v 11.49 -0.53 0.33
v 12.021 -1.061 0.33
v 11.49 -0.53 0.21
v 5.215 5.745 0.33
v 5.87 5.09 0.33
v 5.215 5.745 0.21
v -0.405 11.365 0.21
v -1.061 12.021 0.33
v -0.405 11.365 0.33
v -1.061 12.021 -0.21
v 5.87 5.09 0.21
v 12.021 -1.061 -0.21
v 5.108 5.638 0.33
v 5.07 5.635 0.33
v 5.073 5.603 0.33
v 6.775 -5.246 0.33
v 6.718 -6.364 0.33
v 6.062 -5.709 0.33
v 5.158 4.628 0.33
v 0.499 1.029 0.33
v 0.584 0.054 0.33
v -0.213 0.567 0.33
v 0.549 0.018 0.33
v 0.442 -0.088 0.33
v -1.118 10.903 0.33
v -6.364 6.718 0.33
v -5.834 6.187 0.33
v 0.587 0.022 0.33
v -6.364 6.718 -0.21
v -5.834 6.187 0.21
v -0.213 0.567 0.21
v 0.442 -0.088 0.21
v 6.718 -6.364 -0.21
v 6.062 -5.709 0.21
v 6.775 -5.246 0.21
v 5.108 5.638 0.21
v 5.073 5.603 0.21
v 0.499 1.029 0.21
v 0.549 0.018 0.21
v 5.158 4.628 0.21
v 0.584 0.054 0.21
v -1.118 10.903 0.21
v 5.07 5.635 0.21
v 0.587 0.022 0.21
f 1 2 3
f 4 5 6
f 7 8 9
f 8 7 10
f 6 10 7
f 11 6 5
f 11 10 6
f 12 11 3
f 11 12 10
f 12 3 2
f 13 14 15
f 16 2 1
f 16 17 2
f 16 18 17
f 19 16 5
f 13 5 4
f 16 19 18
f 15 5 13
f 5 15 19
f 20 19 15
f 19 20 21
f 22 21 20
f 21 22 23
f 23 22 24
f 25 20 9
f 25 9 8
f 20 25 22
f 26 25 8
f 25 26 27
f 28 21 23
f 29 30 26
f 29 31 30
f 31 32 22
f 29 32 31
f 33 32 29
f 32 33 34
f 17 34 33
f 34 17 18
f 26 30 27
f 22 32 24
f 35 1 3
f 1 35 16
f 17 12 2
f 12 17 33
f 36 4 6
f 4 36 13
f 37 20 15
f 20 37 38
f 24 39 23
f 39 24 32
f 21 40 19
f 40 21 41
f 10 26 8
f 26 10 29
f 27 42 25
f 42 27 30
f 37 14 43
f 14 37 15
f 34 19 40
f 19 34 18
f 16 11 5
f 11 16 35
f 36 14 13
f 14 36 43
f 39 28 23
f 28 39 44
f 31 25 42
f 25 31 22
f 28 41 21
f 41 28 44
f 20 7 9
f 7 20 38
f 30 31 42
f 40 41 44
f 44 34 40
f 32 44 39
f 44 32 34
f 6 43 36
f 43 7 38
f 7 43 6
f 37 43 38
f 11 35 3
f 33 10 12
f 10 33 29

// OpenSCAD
part( "door" );

preview = true;

shack_width = 15;
shack_depth = 14;
shack_height = 25;

shack_raise = 11;

roof_overhang = 1.5;
roof_radius = 15;
roof_thickness = 0.5;

bottom_thickness = .8;

door_width = 8;
door_height = 20;
doorstep = 1;

bridge_length = 7;

window_width = 6;
window_height = 6;
window_ver_pos = 16;

wall_thickness = 1;
floor_thickness = 1;

frame_width = 0.75;
frame_thickness = 0.06 * 4;

plank_width = 0.75;
plank_thickness = 0.24;

socket_diameter = 24.8;
socket_height = 9.5;

pole_width = 0.5 * 2 + 1.3;

base_thickness = 3;
tolerance = 0.1;

BIAS = 0.02;
INV = 100;

X_AXIS = [1, 0, 0];
Y_AXIS = [0, 1, 0];
Z_AXIS = [0, 0, 1];

ALIGN_CENTER_BOTTOM = [0, 0, -1];

roof_width = shack_width + 2 * roof_overhang;
roof_depth = shack_depth + 2 * roof_overhang;

hinge_x = door_width / 2 - 1.5;
hinge_y = (frame_thickness + plank_thickness - wall_thickness) / 2;


wire_pos = [[shack_width / 2 - wall_thickness - 1.3 / 2,
             shack_depth / 2 - wall_thickness - 1.3 / 2],
            [-shack_width / 2 + wall_thickness + 1.3 / 2,
             shack_depth / 2 - wall_thickness - 1.3 / 2]];
bridge_width = 2 * wire_pos[0][0] - pole_width + 1;

posses = concat([
        [-hinge_x, -hinge_y-shack_depth / 2],
        [wire_pos[0][0], -wire_pos[0][1]]
    ], wire_pos);

beam_thickness = wire_pos[0][0] + posses[0][0] - pole_width;

roof_too_big  = (sqrt(pow(roof_width, 2) + pow(roof_depth, 2)) > socket_diameter);
if (roof_too_big) {
   echo("WARNING: The roof is bigger than the hole for the socket!!!");
}

shack_too_big = (sqrt(pow(shack_width + 2 * (plank_thickness + frame_thickness), 2) + pow(shack_depth + 2 * (plank_thickness + frame_thickness), 2)) > socket_diameter);
if (roof_too_big) {
   echo("WARNING: The shack is bigger than the hole for the socket!!!");
}   

doorstep_too_big = (shack_raise - bottom_thickness > socket_height)
    ? (sqrt(pow(shack_depth + doorstep, 2) + pow((shack_width + door_width)/2, 2)) > socket_diameter)
    : (sqrt(pow(shack_depth / 2 + doorstep, 2) + pow(door_width/2, 2)) > socket_diameter/2);
if(doorstep_too_big) {
    echo("WARNING: The doorstep is bigger than the hole for the socket!!!");
}

bridge_length_too_big = (shack_raise - bottom_thickness > socket_height)
    ? (sqrt(pow(shack_depth + bridge_length, 2) + pow((shack_width + bridge_width)/2, 2)) > socket_diameter)
    : (sqrt(pow(shack_depth / 2 + bridge_length, 2) + pow(bridge_width/2, 2)) > socket_diameter/2);
if(bridge_length_too_big) {
    echo("WARNING: The bridge length is bigger than the hole for the socket!!!");
}

module part(part = "all") {
    $fn= preview ? 16 : 64;
    if (part == "roof") {
        $fn= 128;
        rotate(90, X_AXIS) roof();
        echo("Print layer-height = 0.06");
    } else if (part == "wall_back") {
        $fn= 64;
        rotate(-135, Z_AXIS) rotate(90, X_AXIS) wall_back();
        echo("Print layer-height = 0.06");
    } else if (part == "wall_left") {
        $fn= 64;
        rotate(-135, Z_AXIS) rotate(90, X_AXIS) wall_left();
        echo("Print layer-height = 0.06");
    } else if (part == "wall_right") {
        $fn= 64;
        rotate(-135, Z_AXIS) rotate(90, X_AXIS) wall_right();
        echo("Print layer-height = 0.06");
    } else if (part == "wall_front") {
        $fn= 64;
        rotate(-135, Z_AXIS) rotate(90, X_AXIS) wall_front();
        echo("Print layer-height = 0.06");
    } else if (part == "bottom") {
        bottom();
    } else if (part == "door") {
        rotate(45, Z_AXIS) door();
    } else if (part == "socket") {
        $fn= 128;
        echo("Print layer-height = 0.15");
        socket();
    } else if (part == "beam_left") {
        echo("Print layer-height = 0.06");
        beam_left();
    } else if (part == "beam_right") {
        echo("Print layer-height = 0.06");
        beam_right();
    } else if (part == "servo_mount") {    
        $fn= 64;
        echo("Print layer-height = 0.15");
        rotate(90, Y_AXIS) servo_mount();
    } else if (part == "shack") {
        translate([0, 0, shack_height]) {
            color_if("red", roof_too_big) roof();
        }
        color_if("red", shack_too_big) {
            translate([0, -shack_depth / 2, 0]) rotate(180, Z_AXIS) {
               wall_front();
            }
            translate([+shack_width / 2, 0, 0]) rotate(-90, Z_AXIS) {
               wall_left();
            }
            translate([-shack_width / 2, 0, 0]) rotate(90, Z_AXIS) {
               wall_right();
            }
            translate([0, +shack_depth / 2, 0]) wall_back();
        }
        color_if("red", doorstep_too_big) {
            bottom();
        }
        translate([
            -door_width / 2 + .25,
            -shack_depth/2,
            floor_thickness / 2 + door_height /2])
        {
            rotate(-60, Z_AXIS) rotate(90, X_AXIS) door();
        }
    } else if (part == "all") {
        translate([0, 0, shack_raise]) {
            part("shack");
        }
        translate([0,0, shack_raise - bottom_thickness]) {
            translate([wire_pos[1][0] + pole_width / 2,0]) {
                rotate(90, Y_AXIS) rotate(-90, Z_AXIS) beam_left();
            }
            translate([wire_pos[0][0] - pole_width / 2,0]) {
                rotate(-90, Y_AXIS) rotate(90, Z_AXIS) beam_right();
            }
        }
        socket();
        servo_mount();
    }
}

module door() {
    door_thickness = 0.06*7;
    
    h = door_height - 0.5 - floor_thickness;
    translate([door_width /2, 0]) {
        cube([door_width - 0.5, h, door_thickness], true);
        intersection() {
            union() {
                for (y=[-(h - frame_width)/2, 0, (h - frame_width)/2]) {
                    translate([0, y]) {
                        cube([door_width - 0.5,
                                frame_width,
                                2 * 0.06 * 2 + door_thickness
                             ], true);
                    }
                }
                for (y=[-(h - frame_width)/4, (h - frame_width)/4]) translate([0, y]) {
                    rotate(50) {
                        cube([door_width * 1.5,
                                 frame_width,
                                 2 * 0.06 * 2 + door_thickness
                             ], true);
                    }
                }
            }
            translate([0,0, (frame_thickness + door_thickness) / 2]) {
                cube([door_width - 0.5, h,  frame_thickness + door_thickness], true);
            }
        }
    }
}
module beam_left() {
    beam();
}
module beam_right() {
    mirror(X_AXIS) {
        beam(-1.5);
    }
}
module beam(c=0) {
    a= shack_raise / 2;
    b= bridge_length;
    linear_extrude(beam_thickness-tolerance) {
        translate([-shack_depth/2, 0]) {
            square([shack_depth + bridge_length, .6]);
        }
        translate([-wire_pos[0][1] - pole_width / 2, a]) {
            rotate(-45) square([sqrt(2) * a, .6]);
        }
        
        translate([-posses[0][1] + pole_width / 2+c, a]) {
            mirror(X_AXIS) rotate(-45) square([sqrt(2) * a, .6]);
        }
        translate([-posses[0][1] - pole_width / 2+c, b]) {
            rotate(-45) square([sqrt(2) * b, .6]);
        }
    }
}

module socket() {
    difference() {
        union() {
            translate([0,0, -socket_height - BIAS]) {
                cylinder(d=socket_diameter, h=socket_height + BIAS);
            }
            if(shack_raise == 0) {
                color_if("red", doorstep_too_big) bottom();
            }
            translate([0,0, -socket_height])
            aligned_cube([35,35,base_thickness], [0,0,1]);
            for (pos = posses) {
                translate([pos[0], pos[1], -BIAS]) {
                    linear_extrude(shack_raise - bottom_thickness + BIAS)                    square(pole_width, true);
                }
            }
        }
        translate([-hinge_x, -hinge_y-shack_depth / 2]) {
            
        }
        
        translate([-hinge_x, -hinge_y-shack_depth / 2, 
            -socket_height - base_thickness])
        {
            translate([0,-8.6]) cylinder(d=3.2, h=6+2*BIAS, center = true);
            translate([0,27.7-8.6]) cylinder(d=3.2, h=6+2*BIAS, center = true);
        }
        for(x=[-12,12], y=[-12,12]) translate([x,y, -14]) {
            cylinder(d1=10, d2=4,3);
            cylinder(d=4,100);
        }
        for (pos = posses) {
            translate([pos[0], pos[1]]) {
                linear_extrude(2*shack_height, center=true) {
                    square(1.3, true);
                }
            }   
        }
        for (pos = wire_pos) {
            h=base_thickness+socket_height - 1.5 -1;
            translate([pos[0], pos[1], -base_thickness-socket_height]) {
                cylinder(d=3, h=2*h, center= true);
                translate([0,0,h]) cylinder(d1=3, d2=0, h=1.5);
                translate([-1.7/2, 1/7/2, 1.7]) {
                    rotate(-90, X_AXIS) cube([1.7, 2.6, 35]);
                }
            }
        }
    }
    
    
}

module servo_mount() {
    translate([-hinge_x, -hinge_y-shack_depth / 2, 
                -socket_height - base_thickness - 14])
    {
        difference() {
            union() {
                translate([(-12.2+3)/2, -5.8-4.8]) cube([12.2+3,32.2, 14]);
                translate([+12.2/2, -5.8-4.8,-14]) cube([4.5,12, 18]);
            }
            translate([-12.2/2, -5.6-.8,-BIAS]) cube([12.2,23, 17+2+2*BIAS]);
            
            translate([-12.2/2, -5.6,-BIAS]) cube([12.2,22.6, 17+2+2*BIAS]);
            
            translate([0,-8.6,-BIAS]) cylinder(d=2.4, h=17 + 2 * BIAS);
            translate([0,27.7-8.6,-BIAS]) cylinder(d=2.4, h=17 + 2 * BIAS);
            for(z=[1,1+13.8]) translate([12.2/2+4.5,-3,5 -z]) rotate(90, Y_AXIS) {
                cylinder(d=4, h=9+2*BIAS, center=true);
            }translate([0,0,14]) {
                intersection() {
                    cylinder(r=17,h=2*6,center=true);
                    translate([0,40/2-5.5,0])cube(40,true);
                }
            }
        }
    }
    
}

module bottom() {
    difference() {
        union() {
            translate([0,0,.5*floor_thickness]) {
                cube([shack_width - 2 * wall_thickness - 2 * tolerance,
                      shack_depth - 2 * wall_thickness - 2 * tolerance,
                      floor_thickness], true);
            }
            translate([0,
                       -wall_thickness - frame_thickness - 
                           plank_thickness - doorstep,
                       .5*floor_thickness])
            {
               cube([door_width - .2,
                  shack_depth - 2 * wall_thickness,
                  floor_thickness], true);
            }
            translate([0, (shack_depth - 2 * wall_thickness)/2 - .2]) {
                aligned_cube([shack_width - 2 * wall_thickness - .2, 4.5, 6], 
                             [0,1,-1]);
            }
            translate([0,0,-bottom_thickness/2]) {
                cube([shack_width + 2 * (plank_thickness + frame_thickness),
                      shack_depth + 2 * (plank_thickness + frame_thickness),
                      bottom_thickness], true);
            }
            color_if("red", bridge_length_too_big) {
                aligned_cube([bridge_width, bridge_length + shack_depth / 2, bottom_thickness], [0,1,1]);
            }
        }
        for (pos = posses) {
            translate([pos[0], pos[1]]) {
                linear_extrude(2*shack_height, center=true) {
                    circle(d=1.3, true);
                }
            }   
        }
    }
}


module wall_front() {
    render(convexity = 1) difference() {
        union() {
            wall_front_back();
            door_frame("union");
        }
        door_frame("difference");
        translate([hinge_x, hinge_y, 0]) {
            cylinder(d=.75, h= door_height + 0.5);
        }
    }
}

module wall_left() {
    render(convexity = 1) wall_side();
}

module wall_right() {
    render(convexity = 1) difference() {
        union() {
            wall_side();
            translate([0,0,window_ver_pos]) window("union");
        }
        translate([0,0,window_ver_pos]) window("difference");
    }
}

module wall_back() {
    render(convexity = 1) wall_front_back();
}

module door_frame(modifier) {
    if(modifier == "union") {
        translate([0, plank_thickness + frame_thickness,0]) {
            aligned_cube([  door_width + 2 * frame_width, 
                    wall_thickness,
                    door_height + frame_width
                ], [0, 1,-1]);
        }
    } else if (modifier == "difference") {
        cube([  door_width, 
                2 * (wall_thickness + BIAS),
                2 * door_height
            ], true);
    } else {
        difference() {
            door_frame("union");
            door_frame("difference");                
        }
    }
}

module window(modifier) {
    translate([0, plank_thickness + frame_thickness, 0]) {
        if(modifier == "union") {
            
                aligned_cube([  window_width + 2 * frame_width, 
                        wall_thickness,
                        window_height + 2 * frame_width
                    ], [0, 1,0]);
            
        } else if (modifier == "difference") {
            difference() {
                cube([window_width, 3 * (wall_thickness), window_height],
                    true);
                cube([window_width + 2 * BIAS, 1, 1], true);
                cube([1, 1, window_height + 2 * BIAS], true);
            }
        } else {
            difference() {
                window("union");
                window("difference");                
            }
        }
    }
}

module wall_side() {
    intersection() {
        wall([shack_depth, shack_height]);
        translate([0,-shack_width/2])rotate(90, Z_AXIS) wall_intersecter();
    }
}

module wall_front_back() {
    intersection() {
        wall([shack_width, shack_height]);
        wall_intersecter();
    }
}

module wall_intersecter() {
    translate([0,0, shack_height - roof_radius]) {
        rotate(90, X_AXIS) {
            cylinder(r = roof_radius, h = 2 * shack_depth, center=true);
        }
    }
}

module wall(dim) {
    plank_number = floor((dim[0] / plank_width - 2) / 2) * 2;
    points = concat(
        [
            for(i=[-plank_number/2:2:plank_number/2], j=[0:3]) [
                (i + (j <= 1?-.5:.5)) * plank_width,
                j == 0 || j == 3 ? 0 : plank_thickness
            ]
        ], [
            [ dim[0]/2,0],
            [ dim[0]/2-wall_thickness,-wall_thickness],
            [-dim[0]/2+wall_thickness,-wall_thickness],
            [-dim[0]/2,0]
        ]
    );
    linear_extrude(dim[1]) polygon(points, convexity=1);
}

module roof() {
    rib_period   = 0.8;
    rib_attitude = 0.4;
    
    max_height = roof_radius + roof_thickness + rib_attitude;
    
    divider = preview ? 4: 6;
    points = concat(
        [
            for(y=concat(
                [for(n=[-roof_depth / 2 : rib_period / divider : roof_depth / 2]) n],
                roof_depth / 2)
            ) [
                roof_radius + roof_thickness
                    + rib_attitude * (cos(y / rib_period * 360) + 1) / 2,
                y
            ]
        ], [
            [0, +roof_depth / 2],
            [0, -roof_depth / 2],
        ]
    );
    translate([0, 0, -roof_radius]) intersection() {
        rotate(90, X_AXIS)difference() {
            rotate_extrude(convexity=8) polygon(points);
            cylinder(r=roof_radius, h=roof_depth + BIAS*2, center=true);
        }
        aligned_cube([roof_width, roof_depth, max_height], ALIGN_CENTER_BOTTOM);
    }
}

module copy_mirror(vec) {
    children();
    mirror(vec) children();
} 

module color_if(c, predicate) {
    if (predicate) {
        color(c) children();
    } else {
        children();
    }
}

module aligned_cube(dim, alignment) {
    translate(array_mul(dim, [-.5,-.5,-.5], alignment)) cube(dim, true);
}

function array_mul(a, b, c, d, e) = (c != undef)
    ? array_mul(array_mul(a, b), c, d, e)
    : [for(n=[0:min(len(a),len(b))-1])a[n]*b[n]];

function list(a, n) = [
    for(i=[0:n-1])a 
];
